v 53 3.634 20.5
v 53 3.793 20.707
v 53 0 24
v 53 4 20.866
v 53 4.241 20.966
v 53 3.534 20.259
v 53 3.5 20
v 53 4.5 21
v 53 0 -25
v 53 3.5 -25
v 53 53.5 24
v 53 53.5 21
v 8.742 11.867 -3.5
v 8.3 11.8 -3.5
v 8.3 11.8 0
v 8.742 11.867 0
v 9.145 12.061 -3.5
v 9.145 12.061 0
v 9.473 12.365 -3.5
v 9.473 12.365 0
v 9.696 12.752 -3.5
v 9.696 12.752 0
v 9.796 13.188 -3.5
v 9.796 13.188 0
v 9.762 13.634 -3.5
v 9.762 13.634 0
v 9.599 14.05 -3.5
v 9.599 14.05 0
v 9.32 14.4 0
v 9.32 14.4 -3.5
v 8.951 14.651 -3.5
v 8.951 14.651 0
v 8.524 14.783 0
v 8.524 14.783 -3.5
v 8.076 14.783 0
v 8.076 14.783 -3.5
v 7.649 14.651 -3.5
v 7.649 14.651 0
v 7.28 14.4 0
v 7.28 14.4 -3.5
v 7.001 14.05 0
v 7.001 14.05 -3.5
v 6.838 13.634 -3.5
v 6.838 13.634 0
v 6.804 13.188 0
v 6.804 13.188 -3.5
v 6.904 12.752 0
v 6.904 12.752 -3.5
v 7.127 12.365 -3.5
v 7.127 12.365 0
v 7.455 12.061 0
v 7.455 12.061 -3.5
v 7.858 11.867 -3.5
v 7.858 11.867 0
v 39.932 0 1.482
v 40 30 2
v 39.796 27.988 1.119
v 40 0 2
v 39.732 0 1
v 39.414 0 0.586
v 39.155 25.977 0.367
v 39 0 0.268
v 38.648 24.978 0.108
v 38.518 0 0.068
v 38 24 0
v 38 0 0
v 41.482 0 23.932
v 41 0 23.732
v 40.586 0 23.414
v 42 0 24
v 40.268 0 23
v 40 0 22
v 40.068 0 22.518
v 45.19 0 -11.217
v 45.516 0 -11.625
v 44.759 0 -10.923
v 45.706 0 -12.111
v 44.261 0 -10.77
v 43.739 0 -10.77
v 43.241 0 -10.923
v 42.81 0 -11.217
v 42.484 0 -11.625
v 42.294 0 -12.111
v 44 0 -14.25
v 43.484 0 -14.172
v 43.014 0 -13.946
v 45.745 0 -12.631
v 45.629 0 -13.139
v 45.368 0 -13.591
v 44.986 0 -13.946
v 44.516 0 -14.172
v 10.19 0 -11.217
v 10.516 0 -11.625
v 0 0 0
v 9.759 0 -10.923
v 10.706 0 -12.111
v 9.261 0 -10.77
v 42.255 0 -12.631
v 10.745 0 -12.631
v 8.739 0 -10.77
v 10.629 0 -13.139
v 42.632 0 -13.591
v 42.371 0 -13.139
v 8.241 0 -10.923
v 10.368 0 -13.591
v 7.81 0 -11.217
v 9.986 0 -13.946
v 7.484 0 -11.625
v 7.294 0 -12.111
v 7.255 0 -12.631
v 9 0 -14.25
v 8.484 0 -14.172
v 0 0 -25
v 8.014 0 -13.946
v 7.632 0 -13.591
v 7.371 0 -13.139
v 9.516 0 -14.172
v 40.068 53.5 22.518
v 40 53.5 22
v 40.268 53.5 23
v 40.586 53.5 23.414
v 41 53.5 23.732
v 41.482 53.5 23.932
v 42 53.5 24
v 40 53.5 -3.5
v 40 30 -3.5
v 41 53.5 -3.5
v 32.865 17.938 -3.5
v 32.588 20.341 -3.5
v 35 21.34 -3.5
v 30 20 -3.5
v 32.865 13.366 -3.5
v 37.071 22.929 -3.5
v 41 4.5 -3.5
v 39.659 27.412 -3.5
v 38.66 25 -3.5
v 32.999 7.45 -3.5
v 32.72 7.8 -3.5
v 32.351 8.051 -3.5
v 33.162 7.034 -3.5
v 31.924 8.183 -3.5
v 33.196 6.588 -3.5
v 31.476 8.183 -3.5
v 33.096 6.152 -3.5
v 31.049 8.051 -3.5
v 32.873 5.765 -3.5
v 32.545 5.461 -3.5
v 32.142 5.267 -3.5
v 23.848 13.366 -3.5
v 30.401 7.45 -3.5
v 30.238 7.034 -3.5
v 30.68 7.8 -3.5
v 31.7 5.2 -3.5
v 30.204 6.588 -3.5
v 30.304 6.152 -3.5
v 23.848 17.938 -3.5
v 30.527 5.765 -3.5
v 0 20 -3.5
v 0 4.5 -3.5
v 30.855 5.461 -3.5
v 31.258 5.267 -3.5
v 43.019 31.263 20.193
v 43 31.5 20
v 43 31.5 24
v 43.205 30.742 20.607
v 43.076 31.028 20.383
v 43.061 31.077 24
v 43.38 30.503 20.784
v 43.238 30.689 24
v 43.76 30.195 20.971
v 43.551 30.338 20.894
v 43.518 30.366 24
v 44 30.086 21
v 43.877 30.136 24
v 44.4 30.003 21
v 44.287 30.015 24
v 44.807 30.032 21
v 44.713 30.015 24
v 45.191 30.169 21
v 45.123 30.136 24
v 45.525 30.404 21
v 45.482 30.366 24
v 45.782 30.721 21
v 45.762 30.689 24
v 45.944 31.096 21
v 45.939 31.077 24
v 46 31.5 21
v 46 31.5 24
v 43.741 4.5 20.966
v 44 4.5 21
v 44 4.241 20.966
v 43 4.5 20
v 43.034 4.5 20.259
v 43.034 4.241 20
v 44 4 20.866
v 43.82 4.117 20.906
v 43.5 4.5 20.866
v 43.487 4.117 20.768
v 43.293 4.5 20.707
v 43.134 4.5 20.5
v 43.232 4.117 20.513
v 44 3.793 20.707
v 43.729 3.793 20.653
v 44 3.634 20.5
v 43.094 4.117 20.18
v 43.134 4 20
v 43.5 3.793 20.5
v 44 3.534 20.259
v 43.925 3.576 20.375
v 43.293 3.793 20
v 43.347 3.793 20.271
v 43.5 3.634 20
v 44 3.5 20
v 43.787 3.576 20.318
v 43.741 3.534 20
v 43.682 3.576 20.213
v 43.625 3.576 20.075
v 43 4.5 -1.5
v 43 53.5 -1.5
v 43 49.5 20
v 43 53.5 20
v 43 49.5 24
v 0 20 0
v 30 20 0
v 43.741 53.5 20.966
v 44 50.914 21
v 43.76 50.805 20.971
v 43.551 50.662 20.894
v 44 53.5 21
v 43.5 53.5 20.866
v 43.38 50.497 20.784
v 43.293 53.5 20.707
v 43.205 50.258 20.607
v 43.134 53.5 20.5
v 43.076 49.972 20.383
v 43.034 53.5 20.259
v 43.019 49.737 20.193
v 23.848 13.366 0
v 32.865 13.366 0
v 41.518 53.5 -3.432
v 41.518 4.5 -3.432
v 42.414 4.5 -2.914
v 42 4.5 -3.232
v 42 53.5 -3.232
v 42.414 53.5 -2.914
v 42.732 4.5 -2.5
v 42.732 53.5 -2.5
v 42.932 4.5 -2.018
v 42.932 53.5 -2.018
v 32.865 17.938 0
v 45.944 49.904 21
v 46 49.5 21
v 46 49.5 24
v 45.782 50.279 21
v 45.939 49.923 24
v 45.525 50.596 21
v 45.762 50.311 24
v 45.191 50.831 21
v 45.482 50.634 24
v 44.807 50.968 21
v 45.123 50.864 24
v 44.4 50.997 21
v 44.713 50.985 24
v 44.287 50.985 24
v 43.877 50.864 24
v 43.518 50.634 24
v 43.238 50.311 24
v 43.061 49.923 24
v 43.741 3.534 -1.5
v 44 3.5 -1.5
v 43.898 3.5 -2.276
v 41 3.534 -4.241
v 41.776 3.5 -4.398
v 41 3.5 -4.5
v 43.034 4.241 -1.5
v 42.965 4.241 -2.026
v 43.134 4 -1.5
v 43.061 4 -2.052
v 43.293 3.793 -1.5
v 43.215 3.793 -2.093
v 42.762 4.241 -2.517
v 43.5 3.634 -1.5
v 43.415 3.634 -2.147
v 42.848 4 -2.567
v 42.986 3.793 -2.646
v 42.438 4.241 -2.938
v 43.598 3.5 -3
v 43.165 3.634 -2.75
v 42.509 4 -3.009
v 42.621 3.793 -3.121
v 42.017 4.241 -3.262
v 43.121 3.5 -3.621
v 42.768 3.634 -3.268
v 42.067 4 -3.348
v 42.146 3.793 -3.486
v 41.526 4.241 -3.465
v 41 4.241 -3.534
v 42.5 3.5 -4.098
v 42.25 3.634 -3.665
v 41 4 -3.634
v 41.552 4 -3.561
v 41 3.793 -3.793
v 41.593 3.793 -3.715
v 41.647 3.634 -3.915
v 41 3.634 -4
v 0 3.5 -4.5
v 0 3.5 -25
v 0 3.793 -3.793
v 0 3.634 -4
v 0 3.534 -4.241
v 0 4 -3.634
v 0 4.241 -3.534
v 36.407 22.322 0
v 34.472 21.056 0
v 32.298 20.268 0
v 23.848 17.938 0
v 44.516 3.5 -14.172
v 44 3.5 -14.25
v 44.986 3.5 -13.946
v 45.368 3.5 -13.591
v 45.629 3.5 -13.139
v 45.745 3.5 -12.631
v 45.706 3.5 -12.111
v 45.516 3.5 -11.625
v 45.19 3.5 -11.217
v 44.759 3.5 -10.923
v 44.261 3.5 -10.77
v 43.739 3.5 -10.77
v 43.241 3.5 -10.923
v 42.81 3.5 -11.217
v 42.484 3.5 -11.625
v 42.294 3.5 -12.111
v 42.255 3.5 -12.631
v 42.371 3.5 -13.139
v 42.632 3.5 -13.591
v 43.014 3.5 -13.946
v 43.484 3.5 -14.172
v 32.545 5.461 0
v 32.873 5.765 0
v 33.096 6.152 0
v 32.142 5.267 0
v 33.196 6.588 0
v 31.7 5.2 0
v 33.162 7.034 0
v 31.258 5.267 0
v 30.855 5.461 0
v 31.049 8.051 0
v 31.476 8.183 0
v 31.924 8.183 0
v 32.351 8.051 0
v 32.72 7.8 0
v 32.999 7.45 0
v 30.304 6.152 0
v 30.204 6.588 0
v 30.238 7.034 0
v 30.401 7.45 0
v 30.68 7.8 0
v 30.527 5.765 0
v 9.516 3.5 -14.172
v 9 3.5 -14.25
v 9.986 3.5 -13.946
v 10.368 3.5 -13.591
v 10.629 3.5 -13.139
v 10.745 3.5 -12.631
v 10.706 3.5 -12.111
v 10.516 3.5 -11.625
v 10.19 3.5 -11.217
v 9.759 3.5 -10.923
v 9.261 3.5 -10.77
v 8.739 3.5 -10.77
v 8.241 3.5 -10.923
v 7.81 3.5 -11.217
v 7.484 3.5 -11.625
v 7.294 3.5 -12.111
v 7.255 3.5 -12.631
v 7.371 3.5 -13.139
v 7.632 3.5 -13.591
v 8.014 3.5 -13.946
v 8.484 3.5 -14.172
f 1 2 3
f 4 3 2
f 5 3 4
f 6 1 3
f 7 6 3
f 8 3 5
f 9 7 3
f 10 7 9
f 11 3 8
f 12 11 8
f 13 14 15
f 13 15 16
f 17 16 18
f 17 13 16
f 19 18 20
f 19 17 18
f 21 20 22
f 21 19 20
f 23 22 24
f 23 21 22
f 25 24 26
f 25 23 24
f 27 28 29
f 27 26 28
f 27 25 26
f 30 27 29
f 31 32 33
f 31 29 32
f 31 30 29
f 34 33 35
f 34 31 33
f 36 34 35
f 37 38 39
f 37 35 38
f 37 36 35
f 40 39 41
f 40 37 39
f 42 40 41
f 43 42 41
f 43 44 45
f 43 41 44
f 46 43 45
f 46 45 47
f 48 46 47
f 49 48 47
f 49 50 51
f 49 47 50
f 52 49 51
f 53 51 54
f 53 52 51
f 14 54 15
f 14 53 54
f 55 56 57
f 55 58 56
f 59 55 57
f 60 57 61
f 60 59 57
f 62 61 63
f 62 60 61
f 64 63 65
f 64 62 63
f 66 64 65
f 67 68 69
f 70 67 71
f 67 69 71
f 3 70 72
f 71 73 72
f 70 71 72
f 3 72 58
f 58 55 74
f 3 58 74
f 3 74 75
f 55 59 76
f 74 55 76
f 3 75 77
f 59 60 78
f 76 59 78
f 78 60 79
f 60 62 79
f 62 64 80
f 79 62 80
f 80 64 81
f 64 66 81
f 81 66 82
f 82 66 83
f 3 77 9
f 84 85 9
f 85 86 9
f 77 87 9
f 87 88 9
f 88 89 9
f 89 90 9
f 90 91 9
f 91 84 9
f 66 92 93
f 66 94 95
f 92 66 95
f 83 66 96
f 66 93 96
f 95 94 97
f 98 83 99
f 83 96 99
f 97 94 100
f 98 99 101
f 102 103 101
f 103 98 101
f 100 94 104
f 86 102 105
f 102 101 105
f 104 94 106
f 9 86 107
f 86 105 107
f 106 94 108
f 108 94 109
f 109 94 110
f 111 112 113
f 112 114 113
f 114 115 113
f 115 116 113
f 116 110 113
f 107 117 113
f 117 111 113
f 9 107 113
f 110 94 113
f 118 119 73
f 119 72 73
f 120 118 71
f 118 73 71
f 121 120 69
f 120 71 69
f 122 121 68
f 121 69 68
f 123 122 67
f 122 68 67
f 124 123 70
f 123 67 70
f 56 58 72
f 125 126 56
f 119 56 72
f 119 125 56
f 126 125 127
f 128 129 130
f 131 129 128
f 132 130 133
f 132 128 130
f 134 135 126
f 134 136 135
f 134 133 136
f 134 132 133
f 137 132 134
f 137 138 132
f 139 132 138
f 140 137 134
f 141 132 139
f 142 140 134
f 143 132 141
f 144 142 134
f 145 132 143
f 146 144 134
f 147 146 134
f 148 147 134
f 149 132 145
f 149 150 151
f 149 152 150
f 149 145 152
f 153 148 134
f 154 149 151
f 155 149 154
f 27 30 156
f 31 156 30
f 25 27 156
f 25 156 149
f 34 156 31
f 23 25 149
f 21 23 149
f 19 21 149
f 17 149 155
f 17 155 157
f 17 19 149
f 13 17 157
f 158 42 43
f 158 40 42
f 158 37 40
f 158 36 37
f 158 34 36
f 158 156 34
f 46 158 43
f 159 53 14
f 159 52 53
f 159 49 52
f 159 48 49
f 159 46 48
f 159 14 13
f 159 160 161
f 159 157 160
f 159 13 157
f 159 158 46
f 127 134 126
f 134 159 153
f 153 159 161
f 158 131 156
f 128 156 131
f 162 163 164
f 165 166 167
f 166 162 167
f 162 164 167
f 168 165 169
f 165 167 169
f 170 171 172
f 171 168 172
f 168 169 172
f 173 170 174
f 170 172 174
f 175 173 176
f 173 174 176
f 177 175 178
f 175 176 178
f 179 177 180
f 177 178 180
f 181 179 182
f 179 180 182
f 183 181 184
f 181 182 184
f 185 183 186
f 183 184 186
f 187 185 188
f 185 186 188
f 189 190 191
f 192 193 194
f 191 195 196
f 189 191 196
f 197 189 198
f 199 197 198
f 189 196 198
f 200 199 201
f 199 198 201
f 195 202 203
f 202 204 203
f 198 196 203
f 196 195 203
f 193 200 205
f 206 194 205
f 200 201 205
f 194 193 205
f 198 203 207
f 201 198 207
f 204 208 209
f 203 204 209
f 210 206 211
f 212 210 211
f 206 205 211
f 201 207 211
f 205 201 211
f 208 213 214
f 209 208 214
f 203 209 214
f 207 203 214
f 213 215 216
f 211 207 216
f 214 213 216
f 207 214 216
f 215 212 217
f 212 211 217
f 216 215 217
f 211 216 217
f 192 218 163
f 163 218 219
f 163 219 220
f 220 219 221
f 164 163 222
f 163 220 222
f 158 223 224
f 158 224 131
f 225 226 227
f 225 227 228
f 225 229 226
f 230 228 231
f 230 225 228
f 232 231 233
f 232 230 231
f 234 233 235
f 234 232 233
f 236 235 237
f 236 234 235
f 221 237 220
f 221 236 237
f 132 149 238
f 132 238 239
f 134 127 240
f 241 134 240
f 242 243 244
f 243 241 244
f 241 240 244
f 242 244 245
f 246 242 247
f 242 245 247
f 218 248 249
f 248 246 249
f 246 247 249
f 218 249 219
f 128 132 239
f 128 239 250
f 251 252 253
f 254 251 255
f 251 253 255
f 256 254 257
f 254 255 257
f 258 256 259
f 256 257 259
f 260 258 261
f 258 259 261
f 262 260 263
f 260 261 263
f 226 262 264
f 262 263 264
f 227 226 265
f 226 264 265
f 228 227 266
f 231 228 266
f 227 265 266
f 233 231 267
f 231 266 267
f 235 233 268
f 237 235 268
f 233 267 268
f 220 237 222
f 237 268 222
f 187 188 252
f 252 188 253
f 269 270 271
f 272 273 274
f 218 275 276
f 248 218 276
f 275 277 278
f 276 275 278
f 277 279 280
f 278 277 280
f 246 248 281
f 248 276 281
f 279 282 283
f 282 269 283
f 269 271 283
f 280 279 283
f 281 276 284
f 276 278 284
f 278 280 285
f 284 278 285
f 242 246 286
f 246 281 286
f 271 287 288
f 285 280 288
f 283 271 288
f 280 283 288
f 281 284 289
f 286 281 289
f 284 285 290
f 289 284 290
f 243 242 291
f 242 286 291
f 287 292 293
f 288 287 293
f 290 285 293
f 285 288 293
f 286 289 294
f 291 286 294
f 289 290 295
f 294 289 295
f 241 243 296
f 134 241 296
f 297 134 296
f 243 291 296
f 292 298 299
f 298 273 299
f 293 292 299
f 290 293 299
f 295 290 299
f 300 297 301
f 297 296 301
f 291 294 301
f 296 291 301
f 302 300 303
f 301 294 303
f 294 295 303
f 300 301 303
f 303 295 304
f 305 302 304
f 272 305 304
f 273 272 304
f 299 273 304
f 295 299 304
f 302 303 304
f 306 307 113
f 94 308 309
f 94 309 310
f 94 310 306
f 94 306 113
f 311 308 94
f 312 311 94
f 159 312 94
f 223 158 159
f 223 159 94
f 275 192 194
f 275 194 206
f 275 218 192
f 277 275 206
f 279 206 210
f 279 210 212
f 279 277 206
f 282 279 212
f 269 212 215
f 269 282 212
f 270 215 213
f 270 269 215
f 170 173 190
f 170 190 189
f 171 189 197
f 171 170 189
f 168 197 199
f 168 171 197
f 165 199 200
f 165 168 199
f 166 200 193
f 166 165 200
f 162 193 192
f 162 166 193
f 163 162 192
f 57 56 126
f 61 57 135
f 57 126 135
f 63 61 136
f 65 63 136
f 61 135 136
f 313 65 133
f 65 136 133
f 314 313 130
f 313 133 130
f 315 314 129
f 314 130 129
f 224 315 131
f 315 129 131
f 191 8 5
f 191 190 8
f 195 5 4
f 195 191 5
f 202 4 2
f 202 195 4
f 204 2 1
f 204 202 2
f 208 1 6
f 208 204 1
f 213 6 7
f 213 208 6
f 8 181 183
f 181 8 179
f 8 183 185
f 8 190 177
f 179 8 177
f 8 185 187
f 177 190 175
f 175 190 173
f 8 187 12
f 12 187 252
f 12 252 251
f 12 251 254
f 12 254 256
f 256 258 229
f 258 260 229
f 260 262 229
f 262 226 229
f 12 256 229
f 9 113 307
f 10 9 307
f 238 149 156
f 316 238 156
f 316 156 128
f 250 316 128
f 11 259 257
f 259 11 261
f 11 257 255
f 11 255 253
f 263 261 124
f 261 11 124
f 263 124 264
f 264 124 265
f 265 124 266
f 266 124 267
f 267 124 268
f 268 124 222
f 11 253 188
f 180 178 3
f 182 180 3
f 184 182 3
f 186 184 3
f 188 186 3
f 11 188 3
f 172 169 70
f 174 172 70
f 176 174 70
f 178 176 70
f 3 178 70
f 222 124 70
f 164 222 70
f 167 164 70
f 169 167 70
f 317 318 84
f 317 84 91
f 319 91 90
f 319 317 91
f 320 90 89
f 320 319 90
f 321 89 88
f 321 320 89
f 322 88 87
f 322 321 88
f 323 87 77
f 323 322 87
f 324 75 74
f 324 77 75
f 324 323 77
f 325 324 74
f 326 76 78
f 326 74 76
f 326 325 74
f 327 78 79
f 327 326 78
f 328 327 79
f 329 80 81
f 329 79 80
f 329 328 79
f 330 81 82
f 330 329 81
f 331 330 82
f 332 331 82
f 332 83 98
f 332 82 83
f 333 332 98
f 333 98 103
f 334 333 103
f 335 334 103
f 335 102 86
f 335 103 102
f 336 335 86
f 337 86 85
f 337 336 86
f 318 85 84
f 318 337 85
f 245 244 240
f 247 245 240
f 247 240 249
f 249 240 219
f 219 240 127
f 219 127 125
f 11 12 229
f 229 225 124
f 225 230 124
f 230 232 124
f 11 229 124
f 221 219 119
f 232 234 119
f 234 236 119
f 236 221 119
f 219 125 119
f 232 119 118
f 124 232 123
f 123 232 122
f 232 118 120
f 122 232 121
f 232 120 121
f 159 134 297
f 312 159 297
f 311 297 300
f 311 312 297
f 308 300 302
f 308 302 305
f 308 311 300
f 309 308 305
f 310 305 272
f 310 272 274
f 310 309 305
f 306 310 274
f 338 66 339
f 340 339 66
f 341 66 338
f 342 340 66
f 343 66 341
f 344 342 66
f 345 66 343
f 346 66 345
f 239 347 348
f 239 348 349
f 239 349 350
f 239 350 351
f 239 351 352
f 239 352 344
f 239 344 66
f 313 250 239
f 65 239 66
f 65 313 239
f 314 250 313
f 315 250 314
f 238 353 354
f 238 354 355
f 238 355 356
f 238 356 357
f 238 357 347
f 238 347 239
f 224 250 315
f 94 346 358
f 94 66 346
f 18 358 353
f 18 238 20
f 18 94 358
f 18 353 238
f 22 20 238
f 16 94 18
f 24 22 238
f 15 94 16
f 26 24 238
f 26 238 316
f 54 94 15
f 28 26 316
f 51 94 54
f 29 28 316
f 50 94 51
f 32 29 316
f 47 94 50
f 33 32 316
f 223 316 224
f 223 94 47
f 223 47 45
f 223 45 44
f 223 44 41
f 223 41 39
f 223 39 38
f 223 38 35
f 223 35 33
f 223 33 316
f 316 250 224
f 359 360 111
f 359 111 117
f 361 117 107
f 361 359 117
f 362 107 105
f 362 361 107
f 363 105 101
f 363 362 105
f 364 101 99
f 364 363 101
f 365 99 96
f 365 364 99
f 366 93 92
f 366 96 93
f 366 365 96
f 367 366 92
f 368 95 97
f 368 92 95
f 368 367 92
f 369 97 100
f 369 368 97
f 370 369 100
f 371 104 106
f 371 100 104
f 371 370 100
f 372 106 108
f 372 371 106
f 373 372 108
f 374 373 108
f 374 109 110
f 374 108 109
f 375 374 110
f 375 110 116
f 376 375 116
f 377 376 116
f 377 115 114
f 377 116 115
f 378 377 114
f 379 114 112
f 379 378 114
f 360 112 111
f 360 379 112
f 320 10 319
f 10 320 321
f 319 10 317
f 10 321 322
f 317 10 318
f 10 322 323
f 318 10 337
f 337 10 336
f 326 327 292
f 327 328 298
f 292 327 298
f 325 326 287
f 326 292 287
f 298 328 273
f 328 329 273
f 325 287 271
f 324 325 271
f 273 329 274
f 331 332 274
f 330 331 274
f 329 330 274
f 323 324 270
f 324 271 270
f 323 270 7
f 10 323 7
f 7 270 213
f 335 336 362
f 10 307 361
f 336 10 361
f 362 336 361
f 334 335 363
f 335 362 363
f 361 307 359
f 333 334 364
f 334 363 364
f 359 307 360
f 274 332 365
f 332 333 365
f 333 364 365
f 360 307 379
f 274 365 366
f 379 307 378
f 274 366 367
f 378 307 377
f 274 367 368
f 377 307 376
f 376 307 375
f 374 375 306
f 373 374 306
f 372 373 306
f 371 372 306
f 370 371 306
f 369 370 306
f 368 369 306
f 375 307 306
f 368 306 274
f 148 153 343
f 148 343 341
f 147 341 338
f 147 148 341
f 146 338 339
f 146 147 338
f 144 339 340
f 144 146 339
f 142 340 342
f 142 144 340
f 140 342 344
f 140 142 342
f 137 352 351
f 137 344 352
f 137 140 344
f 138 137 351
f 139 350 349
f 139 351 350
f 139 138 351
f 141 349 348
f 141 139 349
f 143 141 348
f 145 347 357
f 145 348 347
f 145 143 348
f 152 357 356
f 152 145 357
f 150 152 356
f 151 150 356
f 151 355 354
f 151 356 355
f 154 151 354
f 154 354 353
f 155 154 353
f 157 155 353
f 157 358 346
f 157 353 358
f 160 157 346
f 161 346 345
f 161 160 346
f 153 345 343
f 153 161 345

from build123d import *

# Parameters (mm, degrees)
BOSS_EXTRUDE2_DEPTH     = 40
CUT_EXTRUDE1_DEPTH      = 52.23475383
CUT_EXTRUDE1_DEPTH_BACK = 52.23475383
SKETCH4_R               = 1.5
SKETCH4_W               = 9.017
SKETCH4_H               = 4.572
BOSS_EXTRUDE5_DEPTH     = 3
BOSS_EXTRUDE6_DEPTH     = 10
CUT_EXTRUDE2_DEPTH      = 89.24539648
CUT_EXTRUDE2_DEPTH_BACK = 89.24539648
FILLET3_R               = 10
FILLET4_R               = 1
FILLET5_R               = 2
FILLET6_R               = 1
CUT_EXTRUDE3_DEPTH      = 80.348913103
CUT_EXTRUDE3_DEPTH_BACK = 80.348913103
SKETCH10_R              = 1.75


with BuildPart() as part:
    # Sketch3 → Boss-Extrude2 (new body)
    with BuildSketch(Plane(origin=(0, 0, 0), x_dir=(0, 0, -1), z_dir=(1, 0, 0))):
        Polygon((0, 0), (0, 20), (3.5, 20), (3.5, 3.5), (25, 3.5), (25, 0), align=None)
    extrude(amount=BOSS_EXTRUDE2_DEPTH)

    # Sketch4 → Cut-Extrude1 (cut, two sides: drawn at the far end of the back side and taken through both)
    with BuildSketch(Plane.XY.offset(-CUT_EXTRUDE1_DEPTH_BACK)):
        with Locations(Location((8.3, 13.3, 0), (0, 0, 270))):
            Circle(SKETCH4_R)
        with Locations(Location((31.7, 6.7, 0), (0, 0, 270))):
            Circle(SKETCH4_R)
        with Locations((28.3565, 15.6515)):
            Rectangle(SKETCH4_W, SKETCH4_H)
    extrude(amount=CUT_EXTRUDE1_DEPTH + CUT_EXTRUDE1_DEPTH_BACK, mode=Mode.SUBTRACT)

    # Sketch5 → Boss-Extrude5 (add)
    with BuildSketch(Plane(origin=(40, 0, 0), x_dir=(0, 0, -1), z_dir=(1, 0, 0))):
        Polygon((25, 0), (-24, 0), (-24, 3.5), (-24, 53.5), (3.5, 53.5), (3.5, 3.5), (25, 3.5), align=None)
    extrude(amount=BOSS_EXTRUDE5_DEPTH)

    # Sketch7 → Boss-Extrude6 (add)
    with BuildSketch(Plane(origin=(43, 0, 0), x_dir=(0, 0, -1), z_dir=(1, 0, 0))):
        Polygon((3.5, 3.5), (-21, 3.5), (-21, 0), (25, 0), (25, 3.5), align=None)
        Polygon((-21, 53.5), (-24, 53.5), (-24, 0), (-21, 0), (-21, 3.5), align=None)
    extrude(amount=BOSS_EXTRUDE6_DEPTH)

    # Sketch9 → Cut-Extrude2 (cut, two sides: drawn at the far end of the back side and taken through both)
    with BuildSketch(Plane(origin=(0, 0, 21), x_dir=(-1, 0, 0), z_dir=(0, 0, -1)).offset(-CUT_EXTRUDE2_DEPTH_BACK)):
        with BuildLine():
            Line((-46, 31.5), (-46, 49.5))
            ThreePointArc((-46, 49.5), (-44.5, 51), (-43, 49.5))
            Line((-43, 49.5), (-43, 31.5))
            ThreePointArc((-43, 31.5), (-44.5, 30), (-46, 31.5))
        make_face()
    extrude(amount=CUT_EXTRUDE2_DEPTH + CUT_EXTRUDE2_DEPTH_BACK, mode=Mode.SUBTRACT)

    # Fillet3
    fillet3_edges = [part.edges().sort_by_distance(p)[0] for p in [
        (40, 20, -1.75),
    ]]
    fillet(fillet3_edges, radius=FILLET3_R)

    # Fillet4
    fillet4_edges = [part.edges().sort_by_distance(p)[0] for p in [
        (43, 17.5, 21),
        (43, 51.5, 21),
    ]]
    fillet(fillet4_edges, radius=FILLET4_R)

    # Fillet5
    fillet5_edges = [part.edges().sort_by_distance(p)[0] for p in [
        (40, 15, 0),
        (40, 26.75, 24),
        (43, 28.5, -3.5),
    ]]
    fillet(fillet5_edges, radius=FILLET5_R)

    # Fillet6
    fillet6_edges = [part.edges().sort_by_distance(p)[0] for p in [
        (43.292893219, 3.5, 20.707106781),
        (43, 3.5, 9.25),
        (20.5, 3.5, -3.5),
        (42.414213562, 3.5, -2.914213562),
        (48.5, 3.5, 21),
    ]]
    fillet(fillet6_edges, radius=FILLET6_R)

    # Sketch10 → Cut-Extrude3 (cut, two sides: drawn at the far end of the back side and taken through both)
    with BuildSketch(Plane(origin=(0, 0, 0), x_dir=(-1, 0, 0), z_dir=(0, -1, 0)).offset(-CUT_EXTRUDE3_DEPTH_BACK)):
        with Locations(Location((-44, 12.5, 0), (0, 0, 90))):
            Circle(SKETCH10_R)
        with Locations(Location((-9, 12.5, 0), (0, 0, 90))):
            Circle(SKETCH10_R)
    extrude(amount=CUT_EXTRUDE3_DEPTH + CUT_EXTRUDE3_DEPTH_BACK, mode=Mode.SUBTRACT)


solid = part.part
